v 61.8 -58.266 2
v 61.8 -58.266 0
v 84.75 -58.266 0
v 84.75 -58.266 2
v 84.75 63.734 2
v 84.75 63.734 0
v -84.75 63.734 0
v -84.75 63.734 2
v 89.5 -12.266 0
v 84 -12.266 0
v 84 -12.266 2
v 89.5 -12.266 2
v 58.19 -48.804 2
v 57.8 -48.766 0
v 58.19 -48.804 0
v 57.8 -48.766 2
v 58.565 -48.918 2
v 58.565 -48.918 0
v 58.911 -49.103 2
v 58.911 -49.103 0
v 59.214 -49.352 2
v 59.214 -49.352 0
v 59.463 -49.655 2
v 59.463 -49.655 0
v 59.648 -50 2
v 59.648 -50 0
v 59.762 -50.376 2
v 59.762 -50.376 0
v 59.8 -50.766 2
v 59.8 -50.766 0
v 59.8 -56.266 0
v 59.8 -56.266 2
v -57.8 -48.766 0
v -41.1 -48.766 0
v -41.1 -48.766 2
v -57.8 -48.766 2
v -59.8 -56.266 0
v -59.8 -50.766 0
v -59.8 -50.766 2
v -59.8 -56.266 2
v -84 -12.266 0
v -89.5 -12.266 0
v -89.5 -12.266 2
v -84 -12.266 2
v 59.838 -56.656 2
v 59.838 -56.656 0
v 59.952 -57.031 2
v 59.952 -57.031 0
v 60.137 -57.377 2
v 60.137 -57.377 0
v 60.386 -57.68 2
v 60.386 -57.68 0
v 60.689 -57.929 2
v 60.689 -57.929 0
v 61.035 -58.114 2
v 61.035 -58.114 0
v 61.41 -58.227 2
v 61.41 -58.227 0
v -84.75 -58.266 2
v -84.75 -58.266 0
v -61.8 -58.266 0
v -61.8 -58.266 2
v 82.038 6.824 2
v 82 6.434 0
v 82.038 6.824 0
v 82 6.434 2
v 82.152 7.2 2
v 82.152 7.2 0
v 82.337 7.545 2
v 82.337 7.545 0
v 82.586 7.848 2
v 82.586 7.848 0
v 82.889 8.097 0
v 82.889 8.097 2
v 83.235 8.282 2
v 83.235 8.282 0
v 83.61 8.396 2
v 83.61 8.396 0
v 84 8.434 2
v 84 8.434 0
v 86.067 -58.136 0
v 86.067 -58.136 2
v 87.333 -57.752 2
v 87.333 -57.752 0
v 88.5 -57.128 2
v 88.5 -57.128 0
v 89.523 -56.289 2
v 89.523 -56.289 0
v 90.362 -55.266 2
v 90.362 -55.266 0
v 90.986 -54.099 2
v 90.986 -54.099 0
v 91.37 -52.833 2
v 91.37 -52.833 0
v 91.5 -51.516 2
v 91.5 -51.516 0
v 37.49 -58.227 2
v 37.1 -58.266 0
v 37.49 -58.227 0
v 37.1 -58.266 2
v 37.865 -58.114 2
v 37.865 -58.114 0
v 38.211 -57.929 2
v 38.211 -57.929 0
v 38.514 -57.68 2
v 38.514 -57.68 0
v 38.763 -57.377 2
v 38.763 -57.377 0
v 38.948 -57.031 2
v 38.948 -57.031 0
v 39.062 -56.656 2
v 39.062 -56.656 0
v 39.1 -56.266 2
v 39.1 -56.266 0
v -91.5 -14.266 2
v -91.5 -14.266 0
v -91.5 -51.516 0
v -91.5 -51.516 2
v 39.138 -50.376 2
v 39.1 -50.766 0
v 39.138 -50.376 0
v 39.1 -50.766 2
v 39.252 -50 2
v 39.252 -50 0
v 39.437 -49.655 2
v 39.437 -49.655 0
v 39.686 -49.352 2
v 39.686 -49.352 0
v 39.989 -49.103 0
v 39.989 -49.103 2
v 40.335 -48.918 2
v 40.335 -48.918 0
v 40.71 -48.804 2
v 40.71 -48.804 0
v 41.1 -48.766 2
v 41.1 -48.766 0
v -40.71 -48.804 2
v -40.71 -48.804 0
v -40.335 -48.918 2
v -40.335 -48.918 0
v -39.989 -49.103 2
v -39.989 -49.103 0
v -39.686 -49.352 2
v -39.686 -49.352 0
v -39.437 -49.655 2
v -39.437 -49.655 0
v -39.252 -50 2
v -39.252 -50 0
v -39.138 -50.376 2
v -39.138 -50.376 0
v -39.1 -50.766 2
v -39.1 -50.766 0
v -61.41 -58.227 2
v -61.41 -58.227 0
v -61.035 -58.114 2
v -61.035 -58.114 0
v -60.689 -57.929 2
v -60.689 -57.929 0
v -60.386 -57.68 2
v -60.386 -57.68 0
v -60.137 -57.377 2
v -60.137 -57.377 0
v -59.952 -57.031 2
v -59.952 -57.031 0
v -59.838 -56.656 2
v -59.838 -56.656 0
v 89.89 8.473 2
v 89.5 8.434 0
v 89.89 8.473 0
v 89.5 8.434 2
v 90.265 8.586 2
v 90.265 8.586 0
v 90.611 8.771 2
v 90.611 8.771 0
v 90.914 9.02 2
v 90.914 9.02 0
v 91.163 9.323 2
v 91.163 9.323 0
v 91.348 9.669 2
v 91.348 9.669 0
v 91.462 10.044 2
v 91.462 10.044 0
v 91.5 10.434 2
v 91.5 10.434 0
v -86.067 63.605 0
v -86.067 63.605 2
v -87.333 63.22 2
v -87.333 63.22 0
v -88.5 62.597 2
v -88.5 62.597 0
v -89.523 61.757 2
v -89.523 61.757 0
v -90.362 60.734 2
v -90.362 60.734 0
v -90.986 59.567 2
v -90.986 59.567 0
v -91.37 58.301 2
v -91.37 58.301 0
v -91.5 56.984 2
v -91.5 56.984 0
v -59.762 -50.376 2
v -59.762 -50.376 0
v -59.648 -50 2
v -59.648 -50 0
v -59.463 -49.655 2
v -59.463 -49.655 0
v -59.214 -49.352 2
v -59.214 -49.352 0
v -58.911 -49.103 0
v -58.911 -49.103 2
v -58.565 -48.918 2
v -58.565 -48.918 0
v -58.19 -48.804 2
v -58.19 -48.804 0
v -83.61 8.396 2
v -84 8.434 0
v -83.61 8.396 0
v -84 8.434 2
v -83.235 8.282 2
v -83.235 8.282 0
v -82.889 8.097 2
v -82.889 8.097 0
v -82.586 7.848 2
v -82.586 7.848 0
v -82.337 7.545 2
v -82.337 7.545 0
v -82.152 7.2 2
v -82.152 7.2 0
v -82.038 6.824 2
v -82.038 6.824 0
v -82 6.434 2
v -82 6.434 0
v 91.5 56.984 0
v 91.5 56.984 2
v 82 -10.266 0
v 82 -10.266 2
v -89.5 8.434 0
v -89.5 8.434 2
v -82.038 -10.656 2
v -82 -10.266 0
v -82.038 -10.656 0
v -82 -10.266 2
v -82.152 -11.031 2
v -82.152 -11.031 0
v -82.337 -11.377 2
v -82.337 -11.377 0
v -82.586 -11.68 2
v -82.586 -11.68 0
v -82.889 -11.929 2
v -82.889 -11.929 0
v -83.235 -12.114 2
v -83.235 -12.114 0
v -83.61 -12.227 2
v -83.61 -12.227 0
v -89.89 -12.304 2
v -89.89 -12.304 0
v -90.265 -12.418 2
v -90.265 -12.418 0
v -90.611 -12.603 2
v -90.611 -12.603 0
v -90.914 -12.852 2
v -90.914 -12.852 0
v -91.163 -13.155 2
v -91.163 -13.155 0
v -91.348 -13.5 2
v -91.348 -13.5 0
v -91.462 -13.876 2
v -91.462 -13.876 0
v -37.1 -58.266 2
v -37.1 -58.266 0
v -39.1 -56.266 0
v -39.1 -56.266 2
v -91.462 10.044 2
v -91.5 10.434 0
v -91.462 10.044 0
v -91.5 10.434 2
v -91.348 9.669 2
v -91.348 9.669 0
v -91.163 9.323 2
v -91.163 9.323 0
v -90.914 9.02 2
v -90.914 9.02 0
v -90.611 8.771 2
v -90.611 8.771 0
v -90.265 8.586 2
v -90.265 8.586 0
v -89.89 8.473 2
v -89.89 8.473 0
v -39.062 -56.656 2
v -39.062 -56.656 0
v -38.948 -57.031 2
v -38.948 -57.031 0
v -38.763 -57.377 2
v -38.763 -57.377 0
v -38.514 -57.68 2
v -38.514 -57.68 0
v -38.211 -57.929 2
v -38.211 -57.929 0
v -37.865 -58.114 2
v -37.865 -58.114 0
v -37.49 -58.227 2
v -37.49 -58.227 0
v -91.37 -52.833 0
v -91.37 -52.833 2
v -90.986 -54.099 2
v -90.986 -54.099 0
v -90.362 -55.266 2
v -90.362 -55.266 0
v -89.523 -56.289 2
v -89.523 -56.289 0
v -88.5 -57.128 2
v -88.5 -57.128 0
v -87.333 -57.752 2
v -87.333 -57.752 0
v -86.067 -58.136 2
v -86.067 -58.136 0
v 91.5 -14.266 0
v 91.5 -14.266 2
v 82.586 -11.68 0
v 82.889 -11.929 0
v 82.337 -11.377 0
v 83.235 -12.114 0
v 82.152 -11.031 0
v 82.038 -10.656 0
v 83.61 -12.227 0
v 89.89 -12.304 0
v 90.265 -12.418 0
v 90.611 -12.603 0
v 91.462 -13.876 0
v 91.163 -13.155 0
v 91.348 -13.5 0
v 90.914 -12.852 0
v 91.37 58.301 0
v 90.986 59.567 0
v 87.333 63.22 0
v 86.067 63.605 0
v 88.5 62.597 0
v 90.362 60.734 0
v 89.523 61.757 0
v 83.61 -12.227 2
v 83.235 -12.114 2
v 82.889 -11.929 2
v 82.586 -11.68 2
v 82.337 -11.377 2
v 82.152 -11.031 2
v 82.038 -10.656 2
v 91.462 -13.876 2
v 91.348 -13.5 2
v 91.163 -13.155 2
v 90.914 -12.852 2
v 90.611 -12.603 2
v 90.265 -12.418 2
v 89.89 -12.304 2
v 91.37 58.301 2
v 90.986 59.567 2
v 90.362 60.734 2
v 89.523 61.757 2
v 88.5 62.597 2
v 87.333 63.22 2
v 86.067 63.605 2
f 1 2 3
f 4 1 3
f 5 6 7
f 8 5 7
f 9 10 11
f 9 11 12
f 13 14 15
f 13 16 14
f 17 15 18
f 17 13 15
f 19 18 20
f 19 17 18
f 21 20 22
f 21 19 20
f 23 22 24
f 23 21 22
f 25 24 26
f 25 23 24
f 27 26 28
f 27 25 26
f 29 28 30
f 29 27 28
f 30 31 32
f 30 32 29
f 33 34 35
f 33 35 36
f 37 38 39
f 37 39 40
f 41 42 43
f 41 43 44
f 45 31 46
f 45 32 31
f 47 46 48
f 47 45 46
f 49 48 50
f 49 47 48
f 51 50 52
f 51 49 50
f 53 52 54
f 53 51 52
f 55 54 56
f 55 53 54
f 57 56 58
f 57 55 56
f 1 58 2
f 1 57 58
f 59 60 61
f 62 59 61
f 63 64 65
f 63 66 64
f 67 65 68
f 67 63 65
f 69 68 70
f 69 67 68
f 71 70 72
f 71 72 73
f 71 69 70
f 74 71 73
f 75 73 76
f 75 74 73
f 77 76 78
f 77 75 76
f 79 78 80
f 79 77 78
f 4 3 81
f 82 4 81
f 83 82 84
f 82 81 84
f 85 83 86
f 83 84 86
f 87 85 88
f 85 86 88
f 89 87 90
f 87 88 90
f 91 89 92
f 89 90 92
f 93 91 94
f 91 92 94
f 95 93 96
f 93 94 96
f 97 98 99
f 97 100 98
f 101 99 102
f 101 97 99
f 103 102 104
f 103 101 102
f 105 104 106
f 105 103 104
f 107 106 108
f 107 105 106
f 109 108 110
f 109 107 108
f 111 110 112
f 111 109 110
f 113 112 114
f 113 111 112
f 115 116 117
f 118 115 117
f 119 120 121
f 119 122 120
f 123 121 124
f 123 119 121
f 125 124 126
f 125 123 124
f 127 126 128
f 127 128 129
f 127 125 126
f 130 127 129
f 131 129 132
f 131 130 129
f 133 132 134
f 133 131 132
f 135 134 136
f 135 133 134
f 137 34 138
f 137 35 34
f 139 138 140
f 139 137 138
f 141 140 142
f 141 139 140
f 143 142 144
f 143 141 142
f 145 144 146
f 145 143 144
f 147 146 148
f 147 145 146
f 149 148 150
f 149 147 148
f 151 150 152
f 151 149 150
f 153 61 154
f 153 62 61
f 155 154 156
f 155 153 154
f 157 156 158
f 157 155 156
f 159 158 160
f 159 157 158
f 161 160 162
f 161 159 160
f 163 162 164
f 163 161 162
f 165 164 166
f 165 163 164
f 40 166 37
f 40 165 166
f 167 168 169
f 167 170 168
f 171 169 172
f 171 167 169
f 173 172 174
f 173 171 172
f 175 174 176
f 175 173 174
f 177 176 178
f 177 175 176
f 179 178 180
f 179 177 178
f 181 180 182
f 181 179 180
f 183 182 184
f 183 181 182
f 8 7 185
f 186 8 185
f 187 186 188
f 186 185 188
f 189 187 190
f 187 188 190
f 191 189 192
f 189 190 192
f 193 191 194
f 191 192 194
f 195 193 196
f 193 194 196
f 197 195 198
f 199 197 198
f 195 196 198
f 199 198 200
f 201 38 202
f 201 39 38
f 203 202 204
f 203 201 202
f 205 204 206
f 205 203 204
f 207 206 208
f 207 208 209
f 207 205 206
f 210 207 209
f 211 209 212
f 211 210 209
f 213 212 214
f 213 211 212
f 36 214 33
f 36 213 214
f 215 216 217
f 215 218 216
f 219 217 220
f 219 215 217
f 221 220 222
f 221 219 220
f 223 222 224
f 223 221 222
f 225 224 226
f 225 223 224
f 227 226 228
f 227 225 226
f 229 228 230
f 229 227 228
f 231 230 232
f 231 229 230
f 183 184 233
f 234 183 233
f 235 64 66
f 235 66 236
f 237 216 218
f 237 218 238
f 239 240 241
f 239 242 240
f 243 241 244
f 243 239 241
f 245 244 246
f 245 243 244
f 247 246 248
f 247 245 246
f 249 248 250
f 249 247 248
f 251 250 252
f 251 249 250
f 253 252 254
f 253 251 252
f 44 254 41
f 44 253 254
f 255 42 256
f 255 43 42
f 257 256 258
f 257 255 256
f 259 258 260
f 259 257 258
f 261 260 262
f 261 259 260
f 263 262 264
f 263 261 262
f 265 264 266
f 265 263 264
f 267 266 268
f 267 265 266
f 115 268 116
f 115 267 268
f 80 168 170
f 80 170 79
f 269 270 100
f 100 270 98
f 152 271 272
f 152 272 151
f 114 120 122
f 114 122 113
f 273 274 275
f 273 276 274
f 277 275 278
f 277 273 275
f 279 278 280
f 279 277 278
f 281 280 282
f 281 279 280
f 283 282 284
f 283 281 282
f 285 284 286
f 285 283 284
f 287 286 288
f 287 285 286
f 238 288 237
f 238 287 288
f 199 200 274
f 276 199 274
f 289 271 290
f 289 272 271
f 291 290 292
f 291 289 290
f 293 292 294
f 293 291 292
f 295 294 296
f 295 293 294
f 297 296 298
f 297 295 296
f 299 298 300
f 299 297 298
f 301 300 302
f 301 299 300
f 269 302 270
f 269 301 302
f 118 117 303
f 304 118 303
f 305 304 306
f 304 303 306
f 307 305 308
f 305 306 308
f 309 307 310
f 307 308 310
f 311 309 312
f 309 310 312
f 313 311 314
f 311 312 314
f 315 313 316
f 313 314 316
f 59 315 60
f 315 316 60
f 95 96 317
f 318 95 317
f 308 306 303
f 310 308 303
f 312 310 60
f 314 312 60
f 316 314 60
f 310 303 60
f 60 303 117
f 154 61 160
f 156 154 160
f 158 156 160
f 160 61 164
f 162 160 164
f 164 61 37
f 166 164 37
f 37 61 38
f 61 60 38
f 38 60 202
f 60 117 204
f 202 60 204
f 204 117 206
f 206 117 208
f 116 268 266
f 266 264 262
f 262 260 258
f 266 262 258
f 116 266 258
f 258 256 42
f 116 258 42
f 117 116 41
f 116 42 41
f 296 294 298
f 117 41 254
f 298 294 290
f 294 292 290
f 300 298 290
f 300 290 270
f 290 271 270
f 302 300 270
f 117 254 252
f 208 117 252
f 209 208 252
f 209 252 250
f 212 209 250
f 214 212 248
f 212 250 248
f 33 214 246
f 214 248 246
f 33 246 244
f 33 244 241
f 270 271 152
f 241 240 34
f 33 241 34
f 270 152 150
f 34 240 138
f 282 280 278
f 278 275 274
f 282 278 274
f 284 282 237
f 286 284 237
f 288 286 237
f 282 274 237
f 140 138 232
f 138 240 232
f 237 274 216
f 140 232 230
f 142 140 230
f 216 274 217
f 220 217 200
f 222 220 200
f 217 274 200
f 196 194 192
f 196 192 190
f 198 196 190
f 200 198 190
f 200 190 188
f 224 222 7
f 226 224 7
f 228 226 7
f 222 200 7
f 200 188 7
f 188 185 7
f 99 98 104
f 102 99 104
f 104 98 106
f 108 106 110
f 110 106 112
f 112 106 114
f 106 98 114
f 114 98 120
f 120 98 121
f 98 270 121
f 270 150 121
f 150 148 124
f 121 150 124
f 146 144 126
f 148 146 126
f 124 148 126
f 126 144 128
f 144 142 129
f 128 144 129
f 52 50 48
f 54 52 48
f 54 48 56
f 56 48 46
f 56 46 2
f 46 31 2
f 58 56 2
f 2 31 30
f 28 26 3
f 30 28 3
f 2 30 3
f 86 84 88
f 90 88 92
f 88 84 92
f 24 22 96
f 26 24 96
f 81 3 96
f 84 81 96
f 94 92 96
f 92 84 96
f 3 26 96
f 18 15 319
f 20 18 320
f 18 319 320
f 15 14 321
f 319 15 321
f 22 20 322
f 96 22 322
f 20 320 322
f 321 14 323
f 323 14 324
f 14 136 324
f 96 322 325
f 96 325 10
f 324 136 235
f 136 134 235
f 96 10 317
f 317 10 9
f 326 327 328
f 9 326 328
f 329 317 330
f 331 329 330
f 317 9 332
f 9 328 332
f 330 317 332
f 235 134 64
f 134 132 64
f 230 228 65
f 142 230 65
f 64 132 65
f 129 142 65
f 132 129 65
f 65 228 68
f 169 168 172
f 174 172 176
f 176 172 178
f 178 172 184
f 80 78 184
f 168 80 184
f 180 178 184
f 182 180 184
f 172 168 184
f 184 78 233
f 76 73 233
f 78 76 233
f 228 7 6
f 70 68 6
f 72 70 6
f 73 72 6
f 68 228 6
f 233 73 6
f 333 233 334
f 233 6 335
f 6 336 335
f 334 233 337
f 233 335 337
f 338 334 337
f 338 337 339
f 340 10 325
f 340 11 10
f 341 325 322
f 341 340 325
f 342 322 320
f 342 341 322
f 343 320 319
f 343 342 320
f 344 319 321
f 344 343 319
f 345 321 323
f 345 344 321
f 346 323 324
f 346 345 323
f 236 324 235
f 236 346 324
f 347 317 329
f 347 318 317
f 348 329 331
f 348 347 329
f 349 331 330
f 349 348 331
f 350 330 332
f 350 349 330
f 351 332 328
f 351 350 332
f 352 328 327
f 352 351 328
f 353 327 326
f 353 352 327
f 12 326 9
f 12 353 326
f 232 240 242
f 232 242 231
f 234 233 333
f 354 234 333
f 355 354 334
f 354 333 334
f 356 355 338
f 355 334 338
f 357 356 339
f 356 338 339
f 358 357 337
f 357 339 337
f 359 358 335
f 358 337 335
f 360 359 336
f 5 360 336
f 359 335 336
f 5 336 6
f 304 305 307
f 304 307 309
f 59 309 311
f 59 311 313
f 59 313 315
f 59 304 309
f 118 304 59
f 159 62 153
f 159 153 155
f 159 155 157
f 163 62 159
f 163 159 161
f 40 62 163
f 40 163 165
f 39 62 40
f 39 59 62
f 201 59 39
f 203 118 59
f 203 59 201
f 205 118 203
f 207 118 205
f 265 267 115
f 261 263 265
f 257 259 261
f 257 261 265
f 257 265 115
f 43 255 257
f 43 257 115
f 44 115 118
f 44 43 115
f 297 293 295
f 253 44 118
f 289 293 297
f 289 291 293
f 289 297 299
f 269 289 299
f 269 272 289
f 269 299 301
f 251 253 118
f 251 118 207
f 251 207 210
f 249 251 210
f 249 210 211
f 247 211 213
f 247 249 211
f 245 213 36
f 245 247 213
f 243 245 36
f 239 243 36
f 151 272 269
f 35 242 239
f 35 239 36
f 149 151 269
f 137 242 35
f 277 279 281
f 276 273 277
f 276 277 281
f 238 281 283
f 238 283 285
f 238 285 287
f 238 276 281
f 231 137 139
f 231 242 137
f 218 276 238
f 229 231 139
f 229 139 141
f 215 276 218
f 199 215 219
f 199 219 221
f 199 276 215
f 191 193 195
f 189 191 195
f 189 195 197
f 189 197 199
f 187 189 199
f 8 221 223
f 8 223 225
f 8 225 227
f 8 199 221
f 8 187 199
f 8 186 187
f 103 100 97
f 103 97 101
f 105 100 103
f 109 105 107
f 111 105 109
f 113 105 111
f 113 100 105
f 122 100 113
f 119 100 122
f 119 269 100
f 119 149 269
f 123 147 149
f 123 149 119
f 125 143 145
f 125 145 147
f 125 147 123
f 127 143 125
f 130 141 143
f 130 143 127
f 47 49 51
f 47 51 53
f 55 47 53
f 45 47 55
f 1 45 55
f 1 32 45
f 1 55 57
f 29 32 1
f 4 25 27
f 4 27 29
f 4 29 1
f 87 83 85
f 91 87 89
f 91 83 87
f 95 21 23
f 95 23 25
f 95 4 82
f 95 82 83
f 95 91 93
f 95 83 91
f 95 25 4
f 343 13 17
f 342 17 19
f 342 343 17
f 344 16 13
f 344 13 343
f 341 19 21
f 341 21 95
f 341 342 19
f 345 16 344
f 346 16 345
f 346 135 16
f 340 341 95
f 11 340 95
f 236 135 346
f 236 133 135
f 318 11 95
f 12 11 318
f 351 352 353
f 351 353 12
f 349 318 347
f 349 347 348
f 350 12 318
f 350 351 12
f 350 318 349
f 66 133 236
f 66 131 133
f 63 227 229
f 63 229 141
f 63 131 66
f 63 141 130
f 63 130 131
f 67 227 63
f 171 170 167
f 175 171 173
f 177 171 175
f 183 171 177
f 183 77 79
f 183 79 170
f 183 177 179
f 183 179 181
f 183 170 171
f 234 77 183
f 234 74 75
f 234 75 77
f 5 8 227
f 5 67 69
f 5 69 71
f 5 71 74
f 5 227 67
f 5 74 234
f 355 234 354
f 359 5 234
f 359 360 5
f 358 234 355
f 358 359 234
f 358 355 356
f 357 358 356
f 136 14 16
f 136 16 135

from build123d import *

# Parameters (mm, degrees)
PAD_DEPTH = 2
FILLET_R  = 2


with BuildPart() as part:
    # Sketch → Pad (new body)
    with BuildSketch(Plane.XY):
        with BuildLine():
            Line((-91.5, 56.984227), (-91.5, 8.434227))
            Line((-82, 8.434227), (-91.5, 8.434227))
            Line((-82, -12.265773), (-82, 8.434227))
            Line((-91.5, -12.265773), (-82, -12.265773))
            Line((-91.5, -12.265773), (-91.5, -51.515773))
            ThreePointArc((-91.5, -51.515773), (-89.522971, -56.288744), (-84.75, -58.265773))
            Line((-84.75, -58.265773), (-59.8, -58.265773))
            Line((-59.8, -48.765773), (-59.8, -58.265773))
            Line((-39.1, -48.765773), (-59.8, -48.765773))
            Line((-39.1, -58.265773), (-39.1, -48.765773))
            Line((-39.1, -58.265773), (39.1, -58.265773))
            Line((39.1, -48.765773), (39.1, -58.265773))
            Line((59.8, -48.765773), (39.1, -48.765773))
            Line((59.8, -58.265773), (59.8, -48.765773))
            Line((59.8, -58.265773), (84.75, -58.265773))
            ThreePointArc((84.75, -58.265773), (89.522971, -56.288744), (91.5, -51.515773))
            Line((91.5, -51.515773), (91.5, -12.265773))
            Line((82, -12.265773), (91.5, -12.265773))
            Line((82, 8.434227), (82, -12.265773))
            Line((91.5, 8.434227), (82, 8.434227))
            Line((91.5, 8.434227), (91.5, 56.984227))
            ThreePointArc((91.5, 56.984227), (89.522971, 61.757197), (84.75, 63.734227))
            Line((84.75, 63.734227), (-84.75, 63.734227))
            ThreePointArc((-84.75, 63.734227), (-89.522971, 61.757197), (-91.5, 56.984227))
        make_face()
    extrude(amount=PAD_DEPTH)

    # Fillet
    fillet_edges = [part.edges().sort_by_distance(p)[0] for p in [
        (-82, 8.434227, 1),
        (-91.5, 8.434227, 1),
        (-82, -12.265773, 1),
        (-91.5, -12.265773, 1),
        (-39.1, -48.765773, 1),
        (-59.8, -48.765773, 1),
        (39.1, -48.765773, 1),
        (-59.8, -58.265773, 1),
        (-39.1, -58.265773, 1),
        (39.1, -58.265773, 1),
        (59.8, -48.765773, 1),
        (59.8, -58.265773, 1),
        (82, 8.434227, 1),
        (91.5, 8.434227, 1),
        (91.5, -12.265773, 1),
        (82, -12.265773, 1),
    ]]
    fillet(fillet_edges, radius=FILLET_R)


solid = part.part
